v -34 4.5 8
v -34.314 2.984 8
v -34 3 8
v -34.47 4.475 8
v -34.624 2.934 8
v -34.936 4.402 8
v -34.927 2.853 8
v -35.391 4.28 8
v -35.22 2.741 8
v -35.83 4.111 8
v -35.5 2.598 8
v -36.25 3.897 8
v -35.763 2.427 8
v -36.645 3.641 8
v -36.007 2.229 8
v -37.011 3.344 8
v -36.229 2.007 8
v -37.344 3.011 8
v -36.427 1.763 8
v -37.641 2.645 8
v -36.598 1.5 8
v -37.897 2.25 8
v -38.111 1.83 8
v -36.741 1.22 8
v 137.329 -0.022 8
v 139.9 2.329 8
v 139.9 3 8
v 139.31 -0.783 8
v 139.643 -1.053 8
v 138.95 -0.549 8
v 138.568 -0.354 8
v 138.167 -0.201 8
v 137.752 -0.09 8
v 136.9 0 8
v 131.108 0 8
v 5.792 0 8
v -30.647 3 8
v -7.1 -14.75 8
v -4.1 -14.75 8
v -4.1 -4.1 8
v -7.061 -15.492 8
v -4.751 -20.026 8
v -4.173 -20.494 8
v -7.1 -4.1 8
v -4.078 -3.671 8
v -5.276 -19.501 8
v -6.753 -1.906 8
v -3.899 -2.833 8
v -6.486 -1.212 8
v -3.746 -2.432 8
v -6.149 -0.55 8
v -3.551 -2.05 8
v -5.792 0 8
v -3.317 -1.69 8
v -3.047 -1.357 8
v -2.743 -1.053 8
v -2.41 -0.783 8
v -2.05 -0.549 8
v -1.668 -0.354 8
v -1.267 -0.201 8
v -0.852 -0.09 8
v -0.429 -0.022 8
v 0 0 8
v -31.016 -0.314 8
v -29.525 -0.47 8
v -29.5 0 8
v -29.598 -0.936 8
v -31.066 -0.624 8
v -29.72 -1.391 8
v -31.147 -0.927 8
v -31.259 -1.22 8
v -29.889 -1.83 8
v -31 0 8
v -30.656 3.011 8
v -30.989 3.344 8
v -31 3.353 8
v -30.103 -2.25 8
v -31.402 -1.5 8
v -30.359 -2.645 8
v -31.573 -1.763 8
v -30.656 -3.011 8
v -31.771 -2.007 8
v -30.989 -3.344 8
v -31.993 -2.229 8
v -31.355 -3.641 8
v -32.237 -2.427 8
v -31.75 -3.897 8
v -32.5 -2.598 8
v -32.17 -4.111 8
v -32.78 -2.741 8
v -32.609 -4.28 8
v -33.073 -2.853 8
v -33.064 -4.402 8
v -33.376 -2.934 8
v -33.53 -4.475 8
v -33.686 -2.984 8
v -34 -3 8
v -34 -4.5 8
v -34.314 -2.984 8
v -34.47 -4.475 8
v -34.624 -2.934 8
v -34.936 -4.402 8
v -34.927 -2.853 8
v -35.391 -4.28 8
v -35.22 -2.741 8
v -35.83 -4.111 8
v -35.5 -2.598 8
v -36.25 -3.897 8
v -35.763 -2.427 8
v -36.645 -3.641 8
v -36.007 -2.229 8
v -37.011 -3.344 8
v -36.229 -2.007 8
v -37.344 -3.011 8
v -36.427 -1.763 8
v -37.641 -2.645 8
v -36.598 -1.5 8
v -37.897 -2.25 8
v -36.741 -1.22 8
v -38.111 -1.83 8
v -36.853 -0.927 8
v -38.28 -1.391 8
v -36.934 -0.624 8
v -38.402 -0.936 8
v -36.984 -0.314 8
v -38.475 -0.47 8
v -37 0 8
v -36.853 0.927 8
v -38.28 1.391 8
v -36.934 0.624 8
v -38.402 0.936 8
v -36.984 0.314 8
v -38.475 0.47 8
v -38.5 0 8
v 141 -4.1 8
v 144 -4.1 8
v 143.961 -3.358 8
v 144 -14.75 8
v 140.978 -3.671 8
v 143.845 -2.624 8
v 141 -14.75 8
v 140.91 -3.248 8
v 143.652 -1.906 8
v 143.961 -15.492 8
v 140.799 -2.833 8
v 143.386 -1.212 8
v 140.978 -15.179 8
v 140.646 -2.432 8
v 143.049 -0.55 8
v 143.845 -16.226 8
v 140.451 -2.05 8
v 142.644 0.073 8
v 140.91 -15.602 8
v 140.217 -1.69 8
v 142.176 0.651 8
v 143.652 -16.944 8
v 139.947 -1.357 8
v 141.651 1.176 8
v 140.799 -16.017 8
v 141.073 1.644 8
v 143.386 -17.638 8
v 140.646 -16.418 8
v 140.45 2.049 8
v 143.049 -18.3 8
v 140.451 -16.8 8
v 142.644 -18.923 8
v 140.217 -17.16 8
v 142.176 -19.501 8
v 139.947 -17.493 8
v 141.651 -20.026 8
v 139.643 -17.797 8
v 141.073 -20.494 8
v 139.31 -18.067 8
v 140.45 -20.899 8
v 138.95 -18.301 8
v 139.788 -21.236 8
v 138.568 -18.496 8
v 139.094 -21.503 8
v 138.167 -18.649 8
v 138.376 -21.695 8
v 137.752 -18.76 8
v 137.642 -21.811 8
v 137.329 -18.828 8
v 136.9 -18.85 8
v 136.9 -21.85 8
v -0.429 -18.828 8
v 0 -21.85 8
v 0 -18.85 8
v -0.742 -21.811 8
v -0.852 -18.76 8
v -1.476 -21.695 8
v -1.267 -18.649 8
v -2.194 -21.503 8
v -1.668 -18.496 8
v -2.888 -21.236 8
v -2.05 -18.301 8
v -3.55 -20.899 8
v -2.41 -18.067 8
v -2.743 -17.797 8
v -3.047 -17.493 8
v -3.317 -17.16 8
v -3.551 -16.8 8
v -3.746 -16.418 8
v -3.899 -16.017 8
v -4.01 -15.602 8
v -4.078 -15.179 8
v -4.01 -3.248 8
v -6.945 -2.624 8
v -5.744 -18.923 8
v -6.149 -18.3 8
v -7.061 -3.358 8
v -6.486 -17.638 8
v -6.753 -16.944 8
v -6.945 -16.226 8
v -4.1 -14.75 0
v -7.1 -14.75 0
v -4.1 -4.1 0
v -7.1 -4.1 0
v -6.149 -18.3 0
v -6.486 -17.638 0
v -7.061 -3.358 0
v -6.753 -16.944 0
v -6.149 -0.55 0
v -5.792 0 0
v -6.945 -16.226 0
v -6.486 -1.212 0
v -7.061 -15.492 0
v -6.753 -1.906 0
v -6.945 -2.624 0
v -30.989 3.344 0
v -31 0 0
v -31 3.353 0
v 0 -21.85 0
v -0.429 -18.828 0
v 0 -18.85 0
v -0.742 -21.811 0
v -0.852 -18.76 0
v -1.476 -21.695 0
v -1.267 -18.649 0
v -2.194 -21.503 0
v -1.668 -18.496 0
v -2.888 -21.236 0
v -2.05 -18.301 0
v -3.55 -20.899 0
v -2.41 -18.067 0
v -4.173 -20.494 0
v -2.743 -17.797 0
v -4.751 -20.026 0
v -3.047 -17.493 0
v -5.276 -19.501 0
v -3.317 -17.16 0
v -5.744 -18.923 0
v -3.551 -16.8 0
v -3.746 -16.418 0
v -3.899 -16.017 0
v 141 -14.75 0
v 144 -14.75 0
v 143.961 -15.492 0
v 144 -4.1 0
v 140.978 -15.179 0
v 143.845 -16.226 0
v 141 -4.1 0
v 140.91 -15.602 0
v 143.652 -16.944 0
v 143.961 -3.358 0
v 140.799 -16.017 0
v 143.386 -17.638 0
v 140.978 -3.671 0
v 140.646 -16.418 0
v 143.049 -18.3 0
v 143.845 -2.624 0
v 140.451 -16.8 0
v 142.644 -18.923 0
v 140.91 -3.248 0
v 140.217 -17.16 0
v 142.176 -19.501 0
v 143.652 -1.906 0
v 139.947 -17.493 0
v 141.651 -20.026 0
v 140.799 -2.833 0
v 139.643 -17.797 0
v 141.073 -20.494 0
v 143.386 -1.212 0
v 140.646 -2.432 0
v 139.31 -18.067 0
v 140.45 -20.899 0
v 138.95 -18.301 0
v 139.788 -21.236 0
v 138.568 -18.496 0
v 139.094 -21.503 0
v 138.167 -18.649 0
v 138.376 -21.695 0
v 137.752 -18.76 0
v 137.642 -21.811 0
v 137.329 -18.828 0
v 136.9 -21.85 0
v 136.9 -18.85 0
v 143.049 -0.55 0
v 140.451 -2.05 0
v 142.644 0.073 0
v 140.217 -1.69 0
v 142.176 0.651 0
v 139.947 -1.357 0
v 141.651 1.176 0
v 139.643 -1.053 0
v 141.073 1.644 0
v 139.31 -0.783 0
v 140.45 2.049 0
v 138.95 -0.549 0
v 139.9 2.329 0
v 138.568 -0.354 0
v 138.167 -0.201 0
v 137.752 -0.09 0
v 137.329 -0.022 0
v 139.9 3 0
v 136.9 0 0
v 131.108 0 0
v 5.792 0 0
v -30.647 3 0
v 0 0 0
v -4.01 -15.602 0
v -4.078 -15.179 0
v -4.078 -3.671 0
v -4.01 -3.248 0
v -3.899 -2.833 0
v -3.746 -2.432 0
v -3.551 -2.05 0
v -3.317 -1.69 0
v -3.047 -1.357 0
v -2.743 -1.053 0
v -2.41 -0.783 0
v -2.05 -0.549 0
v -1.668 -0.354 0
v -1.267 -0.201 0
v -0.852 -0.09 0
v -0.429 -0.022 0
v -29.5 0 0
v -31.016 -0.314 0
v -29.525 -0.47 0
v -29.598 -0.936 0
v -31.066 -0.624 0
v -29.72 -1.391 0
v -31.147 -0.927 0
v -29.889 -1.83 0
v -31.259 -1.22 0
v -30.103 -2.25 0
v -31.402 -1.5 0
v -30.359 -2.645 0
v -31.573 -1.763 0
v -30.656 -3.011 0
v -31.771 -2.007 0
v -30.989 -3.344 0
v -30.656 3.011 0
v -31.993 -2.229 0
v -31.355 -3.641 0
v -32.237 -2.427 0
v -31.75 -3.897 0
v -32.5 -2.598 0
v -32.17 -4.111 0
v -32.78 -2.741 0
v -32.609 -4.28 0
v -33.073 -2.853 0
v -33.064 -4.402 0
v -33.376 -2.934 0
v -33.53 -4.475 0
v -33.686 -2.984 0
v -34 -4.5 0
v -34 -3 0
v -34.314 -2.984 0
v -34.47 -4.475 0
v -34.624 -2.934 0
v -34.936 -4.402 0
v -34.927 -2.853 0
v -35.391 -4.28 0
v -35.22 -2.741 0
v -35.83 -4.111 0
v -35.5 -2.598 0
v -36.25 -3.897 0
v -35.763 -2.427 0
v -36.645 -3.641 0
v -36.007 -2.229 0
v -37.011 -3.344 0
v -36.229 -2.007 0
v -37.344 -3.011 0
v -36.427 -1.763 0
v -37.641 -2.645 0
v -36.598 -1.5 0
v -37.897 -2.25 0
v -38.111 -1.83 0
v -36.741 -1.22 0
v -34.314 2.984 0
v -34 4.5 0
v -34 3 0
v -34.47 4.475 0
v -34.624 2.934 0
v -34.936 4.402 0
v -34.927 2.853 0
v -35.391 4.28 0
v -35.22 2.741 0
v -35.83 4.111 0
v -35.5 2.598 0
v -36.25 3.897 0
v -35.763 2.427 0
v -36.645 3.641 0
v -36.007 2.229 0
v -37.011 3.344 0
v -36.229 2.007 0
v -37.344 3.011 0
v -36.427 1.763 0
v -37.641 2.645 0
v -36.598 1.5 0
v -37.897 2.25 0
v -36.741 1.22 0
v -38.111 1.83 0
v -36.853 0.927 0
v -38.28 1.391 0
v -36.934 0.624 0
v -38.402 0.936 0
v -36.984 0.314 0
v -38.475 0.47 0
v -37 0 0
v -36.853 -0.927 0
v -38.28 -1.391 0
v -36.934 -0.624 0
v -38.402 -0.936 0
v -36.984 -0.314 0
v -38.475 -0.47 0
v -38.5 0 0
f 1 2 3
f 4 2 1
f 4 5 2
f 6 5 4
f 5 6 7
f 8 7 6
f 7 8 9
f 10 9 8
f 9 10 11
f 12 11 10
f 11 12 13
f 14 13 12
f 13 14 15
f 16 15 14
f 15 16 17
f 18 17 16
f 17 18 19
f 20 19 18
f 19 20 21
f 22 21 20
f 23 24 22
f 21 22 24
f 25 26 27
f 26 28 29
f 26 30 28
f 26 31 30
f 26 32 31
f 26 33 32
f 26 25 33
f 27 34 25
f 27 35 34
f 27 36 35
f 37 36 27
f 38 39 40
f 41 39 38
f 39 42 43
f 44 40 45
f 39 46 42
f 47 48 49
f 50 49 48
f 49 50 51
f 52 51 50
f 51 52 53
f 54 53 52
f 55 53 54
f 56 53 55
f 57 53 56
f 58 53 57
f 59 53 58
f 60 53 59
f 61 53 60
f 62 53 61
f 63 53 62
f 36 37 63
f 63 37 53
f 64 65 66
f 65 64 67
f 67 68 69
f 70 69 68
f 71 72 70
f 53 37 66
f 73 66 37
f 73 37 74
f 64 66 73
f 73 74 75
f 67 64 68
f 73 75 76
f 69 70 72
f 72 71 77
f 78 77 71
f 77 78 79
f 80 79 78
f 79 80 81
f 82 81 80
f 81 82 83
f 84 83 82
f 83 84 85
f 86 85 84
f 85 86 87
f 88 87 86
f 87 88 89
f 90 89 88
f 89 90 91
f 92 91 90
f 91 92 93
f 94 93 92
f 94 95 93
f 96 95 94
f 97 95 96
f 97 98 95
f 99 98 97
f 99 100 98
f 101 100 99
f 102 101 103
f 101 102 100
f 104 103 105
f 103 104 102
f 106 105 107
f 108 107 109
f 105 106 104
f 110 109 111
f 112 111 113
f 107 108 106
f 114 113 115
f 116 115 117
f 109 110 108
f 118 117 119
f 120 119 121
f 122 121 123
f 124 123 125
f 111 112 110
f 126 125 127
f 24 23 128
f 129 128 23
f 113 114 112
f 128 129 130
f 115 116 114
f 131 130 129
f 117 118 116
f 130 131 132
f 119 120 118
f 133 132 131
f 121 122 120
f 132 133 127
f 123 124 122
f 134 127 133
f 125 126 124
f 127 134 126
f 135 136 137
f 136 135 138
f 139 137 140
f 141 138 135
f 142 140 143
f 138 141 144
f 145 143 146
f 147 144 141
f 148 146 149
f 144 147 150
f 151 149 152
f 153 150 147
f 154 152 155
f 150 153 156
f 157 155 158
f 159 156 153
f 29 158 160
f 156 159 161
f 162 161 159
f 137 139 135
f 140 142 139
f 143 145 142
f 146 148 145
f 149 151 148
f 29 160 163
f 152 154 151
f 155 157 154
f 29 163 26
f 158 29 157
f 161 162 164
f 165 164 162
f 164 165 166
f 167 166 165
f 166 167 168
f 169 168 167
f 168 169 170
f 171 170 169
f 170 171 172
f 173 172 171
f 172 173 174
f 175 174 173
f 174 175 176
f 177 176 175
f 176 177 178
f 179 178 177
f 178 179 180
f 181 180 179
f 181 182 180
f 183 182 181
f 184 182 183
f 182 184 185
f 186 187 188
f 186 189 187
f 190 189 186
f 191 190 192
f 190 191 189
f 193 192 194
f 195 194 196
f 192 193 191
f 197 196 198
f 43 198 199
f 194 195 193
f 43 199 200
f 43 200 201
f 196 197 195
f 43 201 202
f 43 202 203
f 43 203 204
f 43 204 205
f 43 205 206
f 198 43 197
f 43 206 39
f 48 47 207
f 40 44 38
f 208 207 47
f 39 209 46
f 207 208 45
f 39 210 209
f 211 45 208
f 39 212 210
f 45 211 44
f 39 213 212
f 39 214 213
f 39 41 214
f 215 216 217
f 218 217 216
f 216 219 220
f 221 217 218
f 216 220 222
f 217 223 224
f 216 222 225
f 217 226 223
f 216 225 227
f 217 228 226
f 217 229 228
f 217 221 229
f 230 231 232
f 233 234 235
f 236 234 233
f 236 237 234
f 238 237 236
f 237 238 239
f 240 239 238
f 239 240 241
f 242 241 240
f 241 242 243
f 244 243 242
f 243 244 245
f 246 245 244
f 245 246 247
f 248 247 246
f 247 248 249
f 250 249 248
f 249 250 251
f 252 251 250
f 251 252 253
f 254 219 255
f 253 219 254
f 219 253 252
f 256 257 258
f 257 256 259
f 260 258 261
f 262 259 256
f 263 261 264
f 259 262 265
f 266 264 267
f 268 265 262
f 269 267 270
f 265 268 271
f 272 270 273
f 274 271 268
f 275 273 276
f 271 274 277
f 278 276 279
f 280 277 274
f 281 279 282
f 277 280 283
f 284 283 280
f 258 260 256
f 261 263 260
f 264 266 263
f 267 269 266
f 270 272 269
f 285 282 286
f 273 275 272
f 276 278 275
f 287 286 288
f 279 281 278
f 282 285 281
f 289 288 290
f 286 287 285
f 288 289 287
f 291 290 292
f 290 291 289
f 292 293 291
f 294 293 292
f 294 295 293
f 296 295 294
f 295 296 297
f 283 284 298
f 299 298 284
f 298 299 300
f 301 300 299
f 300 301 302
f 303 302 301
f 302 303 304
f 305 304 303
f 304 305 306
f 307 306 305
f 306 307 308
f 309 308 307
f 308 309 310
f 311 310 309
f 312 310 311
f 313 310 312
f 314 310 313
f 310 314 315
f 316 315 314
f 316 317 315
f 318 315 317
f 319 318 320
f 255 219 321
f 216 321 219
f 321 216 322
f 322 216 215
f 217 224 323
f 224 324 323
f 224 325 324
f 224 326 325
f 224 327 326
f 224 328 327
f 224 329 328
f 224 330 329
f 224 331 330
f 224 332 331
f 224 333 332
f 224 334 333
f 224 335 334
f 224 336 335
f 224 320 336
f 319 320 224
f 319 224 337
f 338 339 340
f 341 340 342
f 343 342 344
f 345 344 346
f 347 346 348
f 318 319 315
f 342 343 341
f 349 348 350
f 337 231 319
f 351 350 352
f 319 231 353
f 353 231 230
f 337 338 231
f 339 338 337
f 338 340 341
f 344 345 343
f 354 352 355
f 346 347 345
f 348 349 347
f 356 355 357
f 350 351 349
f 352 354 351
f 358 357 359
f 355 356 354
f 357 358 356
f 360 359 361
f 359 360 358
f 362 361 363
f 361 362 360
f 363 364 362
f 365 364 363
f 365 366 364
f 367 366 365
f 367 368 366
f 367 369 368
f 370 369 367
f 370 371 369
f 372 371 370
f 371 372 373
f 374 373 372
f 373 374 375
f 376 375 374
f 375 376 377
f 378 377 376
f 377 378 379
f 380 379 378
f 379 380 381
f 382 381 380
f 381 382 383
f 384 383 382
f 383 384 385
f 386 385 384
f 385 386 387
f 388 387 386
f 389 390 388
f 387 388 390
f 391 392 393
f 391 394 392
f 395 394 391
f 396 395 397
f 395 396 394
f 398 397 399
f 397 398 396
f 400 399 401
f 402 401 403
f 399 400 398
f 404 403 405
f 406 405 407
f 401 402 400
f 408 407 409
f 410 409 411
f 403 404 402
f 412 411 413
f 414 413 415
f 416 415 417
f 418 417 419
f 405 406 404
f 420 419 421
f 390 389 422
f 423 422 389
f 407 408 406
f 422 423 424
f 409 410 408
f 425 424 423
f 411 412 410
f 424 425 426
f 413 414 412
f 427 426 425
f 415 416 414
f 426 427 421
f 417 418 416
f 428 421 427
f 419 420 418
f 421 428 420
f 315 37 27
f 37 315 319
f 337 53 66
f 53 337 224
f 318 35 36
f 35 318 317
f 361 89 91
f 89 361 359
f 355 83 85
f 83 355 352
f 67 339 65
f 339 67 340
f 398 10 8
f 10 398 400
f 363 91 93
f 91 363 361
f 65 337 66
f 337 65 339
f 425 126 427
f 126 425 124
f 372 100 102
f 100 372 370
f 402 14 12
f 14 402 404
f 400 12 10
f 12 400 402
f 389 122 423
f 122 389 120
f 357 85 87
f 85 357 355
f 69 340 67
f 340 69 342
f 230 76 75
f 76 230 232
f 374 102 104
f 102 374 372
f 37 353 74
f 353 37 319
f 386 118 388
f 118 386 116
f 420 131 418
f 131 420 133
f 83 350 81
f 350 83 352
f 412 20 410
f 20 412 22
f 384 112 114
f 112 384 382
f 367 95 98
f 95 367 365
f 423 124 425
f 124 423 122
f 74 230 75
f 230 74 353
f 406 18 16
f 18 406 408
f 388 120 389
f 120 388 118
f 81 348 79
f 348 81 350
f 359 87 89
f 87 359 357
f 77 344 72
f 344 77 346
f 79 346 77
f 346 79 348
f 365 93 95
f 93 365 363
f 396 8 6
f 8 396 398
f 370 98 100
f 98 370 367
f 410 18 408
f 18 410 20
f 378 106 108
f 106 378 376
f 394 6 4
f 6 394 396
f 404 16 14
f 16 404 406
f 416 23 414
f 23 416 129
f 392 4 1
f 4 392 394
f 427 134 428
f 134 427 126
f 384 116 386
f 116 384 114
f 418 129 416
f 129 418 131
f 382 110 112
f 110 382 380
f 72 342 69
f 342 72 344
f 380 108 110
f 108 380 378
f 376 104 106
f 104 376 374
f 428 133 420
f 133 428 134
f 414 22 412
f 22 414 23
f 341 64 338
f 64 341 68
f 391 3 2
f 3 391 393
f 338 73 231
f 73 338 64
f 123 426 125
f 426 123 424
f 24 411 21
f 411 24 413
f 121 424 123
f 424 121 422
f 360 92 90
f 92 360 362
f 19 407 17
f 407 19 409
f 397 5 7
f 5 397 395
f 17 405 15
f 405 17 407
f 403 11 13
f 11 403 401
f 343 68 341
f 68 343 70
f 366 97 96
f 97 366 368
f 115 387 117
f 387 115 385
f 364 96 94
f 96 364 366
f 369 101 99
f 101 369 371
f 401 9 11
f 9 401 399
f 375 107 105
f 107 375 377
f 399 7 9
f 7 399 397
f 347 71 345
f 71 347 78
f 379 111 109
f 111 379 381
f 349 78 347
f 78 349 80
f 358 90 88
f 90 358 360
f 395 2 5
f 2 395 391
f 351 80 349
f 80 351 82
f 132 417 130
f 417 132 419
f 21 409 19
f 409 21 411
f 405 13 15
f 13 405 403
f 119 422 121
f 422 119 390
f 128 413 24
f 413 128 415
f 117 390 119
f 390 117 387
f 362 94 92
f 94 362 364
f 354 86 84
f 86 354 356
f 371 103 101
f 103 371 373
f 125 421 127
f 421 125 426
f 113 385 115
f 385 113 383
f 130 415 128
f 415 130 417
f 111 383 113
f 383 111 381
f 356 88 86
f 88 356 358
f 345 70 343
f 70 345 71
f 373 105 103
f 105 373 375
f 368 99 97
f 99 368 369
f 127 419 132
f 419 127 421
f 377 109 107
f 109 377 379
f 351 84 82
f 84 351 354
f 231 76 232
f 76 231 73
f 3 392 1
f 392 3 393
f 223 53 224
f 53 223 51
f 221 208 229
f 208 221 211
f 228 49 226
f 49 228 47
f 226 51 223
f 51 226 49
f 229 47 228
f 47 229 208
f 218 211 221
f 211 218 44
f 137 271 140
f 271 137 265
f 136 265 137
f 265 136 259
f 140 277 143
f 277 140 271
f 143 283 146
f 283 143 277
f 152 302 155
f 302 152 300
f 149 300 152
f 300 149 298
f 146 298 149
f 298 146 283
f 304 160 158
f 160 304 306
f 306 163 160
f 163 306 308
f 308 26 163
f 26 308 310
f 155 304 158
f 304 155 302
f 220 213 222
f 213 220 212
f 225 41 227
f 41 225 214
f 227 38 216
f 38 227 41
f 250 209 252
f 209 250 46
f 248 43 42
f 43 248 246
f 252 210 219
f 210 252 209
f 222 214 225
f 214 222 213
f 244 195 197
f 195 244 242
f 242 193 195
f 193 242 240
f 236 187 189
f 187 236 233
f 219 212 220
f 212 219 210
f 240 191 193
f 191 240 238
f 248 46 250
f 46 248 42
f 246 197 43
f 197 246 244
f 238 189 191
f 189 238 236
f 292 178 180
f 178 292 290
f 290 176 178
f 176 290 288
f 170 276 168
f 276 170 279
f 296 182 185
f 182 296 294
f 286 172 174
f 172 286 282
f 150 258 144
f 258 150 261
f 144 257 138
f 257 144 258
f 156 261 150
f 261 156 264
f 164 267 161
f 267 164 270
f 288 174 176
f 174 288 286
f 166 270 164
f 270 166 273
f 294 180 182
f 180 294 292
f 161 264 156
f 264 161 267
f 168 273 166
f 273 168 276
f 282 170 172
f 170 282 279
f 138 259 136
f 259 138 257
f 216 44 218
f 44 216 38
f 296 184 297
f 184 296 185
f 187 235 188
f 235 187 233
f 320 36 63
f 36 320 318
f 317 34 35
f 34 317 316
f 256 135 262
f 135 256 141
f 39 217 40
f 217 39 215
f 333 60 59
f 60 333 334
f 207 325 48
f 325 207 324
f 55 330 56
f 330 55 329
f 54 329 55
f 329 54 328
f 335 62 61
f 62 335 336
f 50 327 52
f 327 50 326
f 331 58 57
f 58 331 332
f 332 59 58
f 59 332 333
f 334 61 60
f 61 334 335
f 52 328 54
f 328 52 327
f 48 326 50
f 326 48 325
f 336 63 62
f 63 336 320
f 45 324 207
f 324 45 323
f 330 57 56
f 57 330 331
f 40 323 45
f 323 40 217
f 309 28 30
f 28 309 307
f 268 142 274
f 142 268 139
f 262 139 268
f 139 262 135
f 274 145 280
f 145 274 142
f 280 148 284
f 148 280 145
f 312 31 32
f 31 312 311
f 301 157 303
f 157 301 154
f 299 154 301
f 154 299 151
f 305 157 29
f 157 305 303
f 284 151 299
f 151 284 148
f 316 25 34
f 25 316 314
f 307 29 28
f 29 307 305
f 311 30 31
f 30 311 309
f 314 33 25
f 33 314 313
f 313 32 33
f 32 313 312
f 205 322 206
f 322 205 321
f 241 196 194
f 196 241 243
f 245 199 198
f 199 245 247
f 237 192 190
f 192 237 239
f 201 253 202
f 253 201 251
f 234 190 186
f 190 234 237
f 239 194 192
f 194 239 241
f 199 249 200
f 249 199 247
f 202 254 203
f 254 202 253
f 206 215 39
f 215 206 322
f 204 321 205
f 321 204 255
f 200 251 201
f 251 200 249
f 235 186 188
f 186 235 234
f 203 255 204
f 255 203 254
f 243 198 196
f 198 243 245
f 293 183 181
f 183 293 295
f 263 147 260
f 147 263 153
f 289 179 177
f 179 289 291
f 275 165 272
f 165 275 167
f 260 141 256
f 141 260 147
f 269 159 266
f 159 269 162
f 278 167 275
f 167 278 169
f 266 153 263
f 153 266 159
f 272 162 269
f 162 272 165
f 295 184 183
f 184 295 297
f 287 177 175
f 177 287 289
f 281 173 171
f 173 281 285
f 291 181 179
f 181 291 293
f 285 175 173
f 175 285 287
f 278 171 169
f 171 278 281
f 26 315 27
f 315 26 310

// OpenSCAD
thickness = 3;
depth = 8;
latch = 5;
arm = 28;
lights = 6;
width = 136.9;
cap_angle = 3;
cap_length = sqrt(2*(cap_angle*cap_angle));
clip_radius = 18.85/2;
clip_diameter = 2* clip_radius;
clip_bulge = 2;
round_rect = 4.1;
$fn = 60;
// Top Connector
translate([-thickness,0,0]){
  cube([width + 2*(thickness),thickness, depth]);
}
// End Top Connector

// Light Arm & Loop
translate([-(arm+lights),0,0]){
difference(){
union(){
cube([arm+lights,thickness,depth]);
cylinder(d=lights+thickness,h=depth);
}
translate([0,0,-1]){
cylinder(d=lights,h=depth+2);
translate([0,0,0]){
cube([3,10,depth+2]);
}
}
}
}
// End Light Arm & Loop


// Railing Clips
translate([0,-(round_rect),0]){
difference(){
union(){    
    cylinder(r=round_rect+thickness,h=depth);
    translate([width,0,0]){
      cylinder(r=round_rect+thickness,h=depth);
    }
    translate([0,-(clip_diameter - (2*round_rect)),0]){
      cylinder(r=round_rect+thickness,h=depth);
    }
    translate([width,-(clip_diameter - (2*round_rect)),0]){
      cylinder(r=round_rect+thickness,h=depth);
    }
    translate([-(round_rect+thickness),-clip_diameter+2*(round_rect),0]){
      cube([width+(2*round_rect)+(2*thickness),clip_diameter-2*(round_rect),depth]);
    }
}
translate([0,0,-1]){
//  translate([-clip_bulge,0,0]){
//  cylinder(d=clip_diameter,h=depth+2);
//  }
//  translate([width + clip_bulge,0,0]){
//    cylinder(d=clip_diameter,h=depth+2);
//  }
  translate([0,-clip_diameter+round_rect-thickness,0]){
    cube([width,clip_diameter+thickness, depth + 2]);
  }
  translate([-round_rect,-clip_diameter+2*(round_rect),0]){
    cube([width+(2*round_rect),clip_diameter-2*(round_rect),depth + 2]);
  }
  // Cap Angle Cuts
  translate([0,0,0]){
    cylinder(r=round_rect,h=depth+2);
    //rotate([0,0,45]){
    //  cube([cap_length,cap_length,10]);
    //}
  }
  translate([width,0,0]){
    cylinder(r=round_rect,h=depth+2);
    //rotate([0,0,45]){
    //  cube([cap_length,cap_length,10]);
    //}
  }
  translate([0,-(clip_diameter - (2*round_rect)),0]){
    cylinder(r=round_rect,h=depth+2);
  }
  translate([width,-(clip_diameter - (2*round_rect)),0]){
    cylinder(r=round_rect,h=depth+2);
  }
  
  // End Cap Angle Cuts
}
}
}
// End Railing Clips
